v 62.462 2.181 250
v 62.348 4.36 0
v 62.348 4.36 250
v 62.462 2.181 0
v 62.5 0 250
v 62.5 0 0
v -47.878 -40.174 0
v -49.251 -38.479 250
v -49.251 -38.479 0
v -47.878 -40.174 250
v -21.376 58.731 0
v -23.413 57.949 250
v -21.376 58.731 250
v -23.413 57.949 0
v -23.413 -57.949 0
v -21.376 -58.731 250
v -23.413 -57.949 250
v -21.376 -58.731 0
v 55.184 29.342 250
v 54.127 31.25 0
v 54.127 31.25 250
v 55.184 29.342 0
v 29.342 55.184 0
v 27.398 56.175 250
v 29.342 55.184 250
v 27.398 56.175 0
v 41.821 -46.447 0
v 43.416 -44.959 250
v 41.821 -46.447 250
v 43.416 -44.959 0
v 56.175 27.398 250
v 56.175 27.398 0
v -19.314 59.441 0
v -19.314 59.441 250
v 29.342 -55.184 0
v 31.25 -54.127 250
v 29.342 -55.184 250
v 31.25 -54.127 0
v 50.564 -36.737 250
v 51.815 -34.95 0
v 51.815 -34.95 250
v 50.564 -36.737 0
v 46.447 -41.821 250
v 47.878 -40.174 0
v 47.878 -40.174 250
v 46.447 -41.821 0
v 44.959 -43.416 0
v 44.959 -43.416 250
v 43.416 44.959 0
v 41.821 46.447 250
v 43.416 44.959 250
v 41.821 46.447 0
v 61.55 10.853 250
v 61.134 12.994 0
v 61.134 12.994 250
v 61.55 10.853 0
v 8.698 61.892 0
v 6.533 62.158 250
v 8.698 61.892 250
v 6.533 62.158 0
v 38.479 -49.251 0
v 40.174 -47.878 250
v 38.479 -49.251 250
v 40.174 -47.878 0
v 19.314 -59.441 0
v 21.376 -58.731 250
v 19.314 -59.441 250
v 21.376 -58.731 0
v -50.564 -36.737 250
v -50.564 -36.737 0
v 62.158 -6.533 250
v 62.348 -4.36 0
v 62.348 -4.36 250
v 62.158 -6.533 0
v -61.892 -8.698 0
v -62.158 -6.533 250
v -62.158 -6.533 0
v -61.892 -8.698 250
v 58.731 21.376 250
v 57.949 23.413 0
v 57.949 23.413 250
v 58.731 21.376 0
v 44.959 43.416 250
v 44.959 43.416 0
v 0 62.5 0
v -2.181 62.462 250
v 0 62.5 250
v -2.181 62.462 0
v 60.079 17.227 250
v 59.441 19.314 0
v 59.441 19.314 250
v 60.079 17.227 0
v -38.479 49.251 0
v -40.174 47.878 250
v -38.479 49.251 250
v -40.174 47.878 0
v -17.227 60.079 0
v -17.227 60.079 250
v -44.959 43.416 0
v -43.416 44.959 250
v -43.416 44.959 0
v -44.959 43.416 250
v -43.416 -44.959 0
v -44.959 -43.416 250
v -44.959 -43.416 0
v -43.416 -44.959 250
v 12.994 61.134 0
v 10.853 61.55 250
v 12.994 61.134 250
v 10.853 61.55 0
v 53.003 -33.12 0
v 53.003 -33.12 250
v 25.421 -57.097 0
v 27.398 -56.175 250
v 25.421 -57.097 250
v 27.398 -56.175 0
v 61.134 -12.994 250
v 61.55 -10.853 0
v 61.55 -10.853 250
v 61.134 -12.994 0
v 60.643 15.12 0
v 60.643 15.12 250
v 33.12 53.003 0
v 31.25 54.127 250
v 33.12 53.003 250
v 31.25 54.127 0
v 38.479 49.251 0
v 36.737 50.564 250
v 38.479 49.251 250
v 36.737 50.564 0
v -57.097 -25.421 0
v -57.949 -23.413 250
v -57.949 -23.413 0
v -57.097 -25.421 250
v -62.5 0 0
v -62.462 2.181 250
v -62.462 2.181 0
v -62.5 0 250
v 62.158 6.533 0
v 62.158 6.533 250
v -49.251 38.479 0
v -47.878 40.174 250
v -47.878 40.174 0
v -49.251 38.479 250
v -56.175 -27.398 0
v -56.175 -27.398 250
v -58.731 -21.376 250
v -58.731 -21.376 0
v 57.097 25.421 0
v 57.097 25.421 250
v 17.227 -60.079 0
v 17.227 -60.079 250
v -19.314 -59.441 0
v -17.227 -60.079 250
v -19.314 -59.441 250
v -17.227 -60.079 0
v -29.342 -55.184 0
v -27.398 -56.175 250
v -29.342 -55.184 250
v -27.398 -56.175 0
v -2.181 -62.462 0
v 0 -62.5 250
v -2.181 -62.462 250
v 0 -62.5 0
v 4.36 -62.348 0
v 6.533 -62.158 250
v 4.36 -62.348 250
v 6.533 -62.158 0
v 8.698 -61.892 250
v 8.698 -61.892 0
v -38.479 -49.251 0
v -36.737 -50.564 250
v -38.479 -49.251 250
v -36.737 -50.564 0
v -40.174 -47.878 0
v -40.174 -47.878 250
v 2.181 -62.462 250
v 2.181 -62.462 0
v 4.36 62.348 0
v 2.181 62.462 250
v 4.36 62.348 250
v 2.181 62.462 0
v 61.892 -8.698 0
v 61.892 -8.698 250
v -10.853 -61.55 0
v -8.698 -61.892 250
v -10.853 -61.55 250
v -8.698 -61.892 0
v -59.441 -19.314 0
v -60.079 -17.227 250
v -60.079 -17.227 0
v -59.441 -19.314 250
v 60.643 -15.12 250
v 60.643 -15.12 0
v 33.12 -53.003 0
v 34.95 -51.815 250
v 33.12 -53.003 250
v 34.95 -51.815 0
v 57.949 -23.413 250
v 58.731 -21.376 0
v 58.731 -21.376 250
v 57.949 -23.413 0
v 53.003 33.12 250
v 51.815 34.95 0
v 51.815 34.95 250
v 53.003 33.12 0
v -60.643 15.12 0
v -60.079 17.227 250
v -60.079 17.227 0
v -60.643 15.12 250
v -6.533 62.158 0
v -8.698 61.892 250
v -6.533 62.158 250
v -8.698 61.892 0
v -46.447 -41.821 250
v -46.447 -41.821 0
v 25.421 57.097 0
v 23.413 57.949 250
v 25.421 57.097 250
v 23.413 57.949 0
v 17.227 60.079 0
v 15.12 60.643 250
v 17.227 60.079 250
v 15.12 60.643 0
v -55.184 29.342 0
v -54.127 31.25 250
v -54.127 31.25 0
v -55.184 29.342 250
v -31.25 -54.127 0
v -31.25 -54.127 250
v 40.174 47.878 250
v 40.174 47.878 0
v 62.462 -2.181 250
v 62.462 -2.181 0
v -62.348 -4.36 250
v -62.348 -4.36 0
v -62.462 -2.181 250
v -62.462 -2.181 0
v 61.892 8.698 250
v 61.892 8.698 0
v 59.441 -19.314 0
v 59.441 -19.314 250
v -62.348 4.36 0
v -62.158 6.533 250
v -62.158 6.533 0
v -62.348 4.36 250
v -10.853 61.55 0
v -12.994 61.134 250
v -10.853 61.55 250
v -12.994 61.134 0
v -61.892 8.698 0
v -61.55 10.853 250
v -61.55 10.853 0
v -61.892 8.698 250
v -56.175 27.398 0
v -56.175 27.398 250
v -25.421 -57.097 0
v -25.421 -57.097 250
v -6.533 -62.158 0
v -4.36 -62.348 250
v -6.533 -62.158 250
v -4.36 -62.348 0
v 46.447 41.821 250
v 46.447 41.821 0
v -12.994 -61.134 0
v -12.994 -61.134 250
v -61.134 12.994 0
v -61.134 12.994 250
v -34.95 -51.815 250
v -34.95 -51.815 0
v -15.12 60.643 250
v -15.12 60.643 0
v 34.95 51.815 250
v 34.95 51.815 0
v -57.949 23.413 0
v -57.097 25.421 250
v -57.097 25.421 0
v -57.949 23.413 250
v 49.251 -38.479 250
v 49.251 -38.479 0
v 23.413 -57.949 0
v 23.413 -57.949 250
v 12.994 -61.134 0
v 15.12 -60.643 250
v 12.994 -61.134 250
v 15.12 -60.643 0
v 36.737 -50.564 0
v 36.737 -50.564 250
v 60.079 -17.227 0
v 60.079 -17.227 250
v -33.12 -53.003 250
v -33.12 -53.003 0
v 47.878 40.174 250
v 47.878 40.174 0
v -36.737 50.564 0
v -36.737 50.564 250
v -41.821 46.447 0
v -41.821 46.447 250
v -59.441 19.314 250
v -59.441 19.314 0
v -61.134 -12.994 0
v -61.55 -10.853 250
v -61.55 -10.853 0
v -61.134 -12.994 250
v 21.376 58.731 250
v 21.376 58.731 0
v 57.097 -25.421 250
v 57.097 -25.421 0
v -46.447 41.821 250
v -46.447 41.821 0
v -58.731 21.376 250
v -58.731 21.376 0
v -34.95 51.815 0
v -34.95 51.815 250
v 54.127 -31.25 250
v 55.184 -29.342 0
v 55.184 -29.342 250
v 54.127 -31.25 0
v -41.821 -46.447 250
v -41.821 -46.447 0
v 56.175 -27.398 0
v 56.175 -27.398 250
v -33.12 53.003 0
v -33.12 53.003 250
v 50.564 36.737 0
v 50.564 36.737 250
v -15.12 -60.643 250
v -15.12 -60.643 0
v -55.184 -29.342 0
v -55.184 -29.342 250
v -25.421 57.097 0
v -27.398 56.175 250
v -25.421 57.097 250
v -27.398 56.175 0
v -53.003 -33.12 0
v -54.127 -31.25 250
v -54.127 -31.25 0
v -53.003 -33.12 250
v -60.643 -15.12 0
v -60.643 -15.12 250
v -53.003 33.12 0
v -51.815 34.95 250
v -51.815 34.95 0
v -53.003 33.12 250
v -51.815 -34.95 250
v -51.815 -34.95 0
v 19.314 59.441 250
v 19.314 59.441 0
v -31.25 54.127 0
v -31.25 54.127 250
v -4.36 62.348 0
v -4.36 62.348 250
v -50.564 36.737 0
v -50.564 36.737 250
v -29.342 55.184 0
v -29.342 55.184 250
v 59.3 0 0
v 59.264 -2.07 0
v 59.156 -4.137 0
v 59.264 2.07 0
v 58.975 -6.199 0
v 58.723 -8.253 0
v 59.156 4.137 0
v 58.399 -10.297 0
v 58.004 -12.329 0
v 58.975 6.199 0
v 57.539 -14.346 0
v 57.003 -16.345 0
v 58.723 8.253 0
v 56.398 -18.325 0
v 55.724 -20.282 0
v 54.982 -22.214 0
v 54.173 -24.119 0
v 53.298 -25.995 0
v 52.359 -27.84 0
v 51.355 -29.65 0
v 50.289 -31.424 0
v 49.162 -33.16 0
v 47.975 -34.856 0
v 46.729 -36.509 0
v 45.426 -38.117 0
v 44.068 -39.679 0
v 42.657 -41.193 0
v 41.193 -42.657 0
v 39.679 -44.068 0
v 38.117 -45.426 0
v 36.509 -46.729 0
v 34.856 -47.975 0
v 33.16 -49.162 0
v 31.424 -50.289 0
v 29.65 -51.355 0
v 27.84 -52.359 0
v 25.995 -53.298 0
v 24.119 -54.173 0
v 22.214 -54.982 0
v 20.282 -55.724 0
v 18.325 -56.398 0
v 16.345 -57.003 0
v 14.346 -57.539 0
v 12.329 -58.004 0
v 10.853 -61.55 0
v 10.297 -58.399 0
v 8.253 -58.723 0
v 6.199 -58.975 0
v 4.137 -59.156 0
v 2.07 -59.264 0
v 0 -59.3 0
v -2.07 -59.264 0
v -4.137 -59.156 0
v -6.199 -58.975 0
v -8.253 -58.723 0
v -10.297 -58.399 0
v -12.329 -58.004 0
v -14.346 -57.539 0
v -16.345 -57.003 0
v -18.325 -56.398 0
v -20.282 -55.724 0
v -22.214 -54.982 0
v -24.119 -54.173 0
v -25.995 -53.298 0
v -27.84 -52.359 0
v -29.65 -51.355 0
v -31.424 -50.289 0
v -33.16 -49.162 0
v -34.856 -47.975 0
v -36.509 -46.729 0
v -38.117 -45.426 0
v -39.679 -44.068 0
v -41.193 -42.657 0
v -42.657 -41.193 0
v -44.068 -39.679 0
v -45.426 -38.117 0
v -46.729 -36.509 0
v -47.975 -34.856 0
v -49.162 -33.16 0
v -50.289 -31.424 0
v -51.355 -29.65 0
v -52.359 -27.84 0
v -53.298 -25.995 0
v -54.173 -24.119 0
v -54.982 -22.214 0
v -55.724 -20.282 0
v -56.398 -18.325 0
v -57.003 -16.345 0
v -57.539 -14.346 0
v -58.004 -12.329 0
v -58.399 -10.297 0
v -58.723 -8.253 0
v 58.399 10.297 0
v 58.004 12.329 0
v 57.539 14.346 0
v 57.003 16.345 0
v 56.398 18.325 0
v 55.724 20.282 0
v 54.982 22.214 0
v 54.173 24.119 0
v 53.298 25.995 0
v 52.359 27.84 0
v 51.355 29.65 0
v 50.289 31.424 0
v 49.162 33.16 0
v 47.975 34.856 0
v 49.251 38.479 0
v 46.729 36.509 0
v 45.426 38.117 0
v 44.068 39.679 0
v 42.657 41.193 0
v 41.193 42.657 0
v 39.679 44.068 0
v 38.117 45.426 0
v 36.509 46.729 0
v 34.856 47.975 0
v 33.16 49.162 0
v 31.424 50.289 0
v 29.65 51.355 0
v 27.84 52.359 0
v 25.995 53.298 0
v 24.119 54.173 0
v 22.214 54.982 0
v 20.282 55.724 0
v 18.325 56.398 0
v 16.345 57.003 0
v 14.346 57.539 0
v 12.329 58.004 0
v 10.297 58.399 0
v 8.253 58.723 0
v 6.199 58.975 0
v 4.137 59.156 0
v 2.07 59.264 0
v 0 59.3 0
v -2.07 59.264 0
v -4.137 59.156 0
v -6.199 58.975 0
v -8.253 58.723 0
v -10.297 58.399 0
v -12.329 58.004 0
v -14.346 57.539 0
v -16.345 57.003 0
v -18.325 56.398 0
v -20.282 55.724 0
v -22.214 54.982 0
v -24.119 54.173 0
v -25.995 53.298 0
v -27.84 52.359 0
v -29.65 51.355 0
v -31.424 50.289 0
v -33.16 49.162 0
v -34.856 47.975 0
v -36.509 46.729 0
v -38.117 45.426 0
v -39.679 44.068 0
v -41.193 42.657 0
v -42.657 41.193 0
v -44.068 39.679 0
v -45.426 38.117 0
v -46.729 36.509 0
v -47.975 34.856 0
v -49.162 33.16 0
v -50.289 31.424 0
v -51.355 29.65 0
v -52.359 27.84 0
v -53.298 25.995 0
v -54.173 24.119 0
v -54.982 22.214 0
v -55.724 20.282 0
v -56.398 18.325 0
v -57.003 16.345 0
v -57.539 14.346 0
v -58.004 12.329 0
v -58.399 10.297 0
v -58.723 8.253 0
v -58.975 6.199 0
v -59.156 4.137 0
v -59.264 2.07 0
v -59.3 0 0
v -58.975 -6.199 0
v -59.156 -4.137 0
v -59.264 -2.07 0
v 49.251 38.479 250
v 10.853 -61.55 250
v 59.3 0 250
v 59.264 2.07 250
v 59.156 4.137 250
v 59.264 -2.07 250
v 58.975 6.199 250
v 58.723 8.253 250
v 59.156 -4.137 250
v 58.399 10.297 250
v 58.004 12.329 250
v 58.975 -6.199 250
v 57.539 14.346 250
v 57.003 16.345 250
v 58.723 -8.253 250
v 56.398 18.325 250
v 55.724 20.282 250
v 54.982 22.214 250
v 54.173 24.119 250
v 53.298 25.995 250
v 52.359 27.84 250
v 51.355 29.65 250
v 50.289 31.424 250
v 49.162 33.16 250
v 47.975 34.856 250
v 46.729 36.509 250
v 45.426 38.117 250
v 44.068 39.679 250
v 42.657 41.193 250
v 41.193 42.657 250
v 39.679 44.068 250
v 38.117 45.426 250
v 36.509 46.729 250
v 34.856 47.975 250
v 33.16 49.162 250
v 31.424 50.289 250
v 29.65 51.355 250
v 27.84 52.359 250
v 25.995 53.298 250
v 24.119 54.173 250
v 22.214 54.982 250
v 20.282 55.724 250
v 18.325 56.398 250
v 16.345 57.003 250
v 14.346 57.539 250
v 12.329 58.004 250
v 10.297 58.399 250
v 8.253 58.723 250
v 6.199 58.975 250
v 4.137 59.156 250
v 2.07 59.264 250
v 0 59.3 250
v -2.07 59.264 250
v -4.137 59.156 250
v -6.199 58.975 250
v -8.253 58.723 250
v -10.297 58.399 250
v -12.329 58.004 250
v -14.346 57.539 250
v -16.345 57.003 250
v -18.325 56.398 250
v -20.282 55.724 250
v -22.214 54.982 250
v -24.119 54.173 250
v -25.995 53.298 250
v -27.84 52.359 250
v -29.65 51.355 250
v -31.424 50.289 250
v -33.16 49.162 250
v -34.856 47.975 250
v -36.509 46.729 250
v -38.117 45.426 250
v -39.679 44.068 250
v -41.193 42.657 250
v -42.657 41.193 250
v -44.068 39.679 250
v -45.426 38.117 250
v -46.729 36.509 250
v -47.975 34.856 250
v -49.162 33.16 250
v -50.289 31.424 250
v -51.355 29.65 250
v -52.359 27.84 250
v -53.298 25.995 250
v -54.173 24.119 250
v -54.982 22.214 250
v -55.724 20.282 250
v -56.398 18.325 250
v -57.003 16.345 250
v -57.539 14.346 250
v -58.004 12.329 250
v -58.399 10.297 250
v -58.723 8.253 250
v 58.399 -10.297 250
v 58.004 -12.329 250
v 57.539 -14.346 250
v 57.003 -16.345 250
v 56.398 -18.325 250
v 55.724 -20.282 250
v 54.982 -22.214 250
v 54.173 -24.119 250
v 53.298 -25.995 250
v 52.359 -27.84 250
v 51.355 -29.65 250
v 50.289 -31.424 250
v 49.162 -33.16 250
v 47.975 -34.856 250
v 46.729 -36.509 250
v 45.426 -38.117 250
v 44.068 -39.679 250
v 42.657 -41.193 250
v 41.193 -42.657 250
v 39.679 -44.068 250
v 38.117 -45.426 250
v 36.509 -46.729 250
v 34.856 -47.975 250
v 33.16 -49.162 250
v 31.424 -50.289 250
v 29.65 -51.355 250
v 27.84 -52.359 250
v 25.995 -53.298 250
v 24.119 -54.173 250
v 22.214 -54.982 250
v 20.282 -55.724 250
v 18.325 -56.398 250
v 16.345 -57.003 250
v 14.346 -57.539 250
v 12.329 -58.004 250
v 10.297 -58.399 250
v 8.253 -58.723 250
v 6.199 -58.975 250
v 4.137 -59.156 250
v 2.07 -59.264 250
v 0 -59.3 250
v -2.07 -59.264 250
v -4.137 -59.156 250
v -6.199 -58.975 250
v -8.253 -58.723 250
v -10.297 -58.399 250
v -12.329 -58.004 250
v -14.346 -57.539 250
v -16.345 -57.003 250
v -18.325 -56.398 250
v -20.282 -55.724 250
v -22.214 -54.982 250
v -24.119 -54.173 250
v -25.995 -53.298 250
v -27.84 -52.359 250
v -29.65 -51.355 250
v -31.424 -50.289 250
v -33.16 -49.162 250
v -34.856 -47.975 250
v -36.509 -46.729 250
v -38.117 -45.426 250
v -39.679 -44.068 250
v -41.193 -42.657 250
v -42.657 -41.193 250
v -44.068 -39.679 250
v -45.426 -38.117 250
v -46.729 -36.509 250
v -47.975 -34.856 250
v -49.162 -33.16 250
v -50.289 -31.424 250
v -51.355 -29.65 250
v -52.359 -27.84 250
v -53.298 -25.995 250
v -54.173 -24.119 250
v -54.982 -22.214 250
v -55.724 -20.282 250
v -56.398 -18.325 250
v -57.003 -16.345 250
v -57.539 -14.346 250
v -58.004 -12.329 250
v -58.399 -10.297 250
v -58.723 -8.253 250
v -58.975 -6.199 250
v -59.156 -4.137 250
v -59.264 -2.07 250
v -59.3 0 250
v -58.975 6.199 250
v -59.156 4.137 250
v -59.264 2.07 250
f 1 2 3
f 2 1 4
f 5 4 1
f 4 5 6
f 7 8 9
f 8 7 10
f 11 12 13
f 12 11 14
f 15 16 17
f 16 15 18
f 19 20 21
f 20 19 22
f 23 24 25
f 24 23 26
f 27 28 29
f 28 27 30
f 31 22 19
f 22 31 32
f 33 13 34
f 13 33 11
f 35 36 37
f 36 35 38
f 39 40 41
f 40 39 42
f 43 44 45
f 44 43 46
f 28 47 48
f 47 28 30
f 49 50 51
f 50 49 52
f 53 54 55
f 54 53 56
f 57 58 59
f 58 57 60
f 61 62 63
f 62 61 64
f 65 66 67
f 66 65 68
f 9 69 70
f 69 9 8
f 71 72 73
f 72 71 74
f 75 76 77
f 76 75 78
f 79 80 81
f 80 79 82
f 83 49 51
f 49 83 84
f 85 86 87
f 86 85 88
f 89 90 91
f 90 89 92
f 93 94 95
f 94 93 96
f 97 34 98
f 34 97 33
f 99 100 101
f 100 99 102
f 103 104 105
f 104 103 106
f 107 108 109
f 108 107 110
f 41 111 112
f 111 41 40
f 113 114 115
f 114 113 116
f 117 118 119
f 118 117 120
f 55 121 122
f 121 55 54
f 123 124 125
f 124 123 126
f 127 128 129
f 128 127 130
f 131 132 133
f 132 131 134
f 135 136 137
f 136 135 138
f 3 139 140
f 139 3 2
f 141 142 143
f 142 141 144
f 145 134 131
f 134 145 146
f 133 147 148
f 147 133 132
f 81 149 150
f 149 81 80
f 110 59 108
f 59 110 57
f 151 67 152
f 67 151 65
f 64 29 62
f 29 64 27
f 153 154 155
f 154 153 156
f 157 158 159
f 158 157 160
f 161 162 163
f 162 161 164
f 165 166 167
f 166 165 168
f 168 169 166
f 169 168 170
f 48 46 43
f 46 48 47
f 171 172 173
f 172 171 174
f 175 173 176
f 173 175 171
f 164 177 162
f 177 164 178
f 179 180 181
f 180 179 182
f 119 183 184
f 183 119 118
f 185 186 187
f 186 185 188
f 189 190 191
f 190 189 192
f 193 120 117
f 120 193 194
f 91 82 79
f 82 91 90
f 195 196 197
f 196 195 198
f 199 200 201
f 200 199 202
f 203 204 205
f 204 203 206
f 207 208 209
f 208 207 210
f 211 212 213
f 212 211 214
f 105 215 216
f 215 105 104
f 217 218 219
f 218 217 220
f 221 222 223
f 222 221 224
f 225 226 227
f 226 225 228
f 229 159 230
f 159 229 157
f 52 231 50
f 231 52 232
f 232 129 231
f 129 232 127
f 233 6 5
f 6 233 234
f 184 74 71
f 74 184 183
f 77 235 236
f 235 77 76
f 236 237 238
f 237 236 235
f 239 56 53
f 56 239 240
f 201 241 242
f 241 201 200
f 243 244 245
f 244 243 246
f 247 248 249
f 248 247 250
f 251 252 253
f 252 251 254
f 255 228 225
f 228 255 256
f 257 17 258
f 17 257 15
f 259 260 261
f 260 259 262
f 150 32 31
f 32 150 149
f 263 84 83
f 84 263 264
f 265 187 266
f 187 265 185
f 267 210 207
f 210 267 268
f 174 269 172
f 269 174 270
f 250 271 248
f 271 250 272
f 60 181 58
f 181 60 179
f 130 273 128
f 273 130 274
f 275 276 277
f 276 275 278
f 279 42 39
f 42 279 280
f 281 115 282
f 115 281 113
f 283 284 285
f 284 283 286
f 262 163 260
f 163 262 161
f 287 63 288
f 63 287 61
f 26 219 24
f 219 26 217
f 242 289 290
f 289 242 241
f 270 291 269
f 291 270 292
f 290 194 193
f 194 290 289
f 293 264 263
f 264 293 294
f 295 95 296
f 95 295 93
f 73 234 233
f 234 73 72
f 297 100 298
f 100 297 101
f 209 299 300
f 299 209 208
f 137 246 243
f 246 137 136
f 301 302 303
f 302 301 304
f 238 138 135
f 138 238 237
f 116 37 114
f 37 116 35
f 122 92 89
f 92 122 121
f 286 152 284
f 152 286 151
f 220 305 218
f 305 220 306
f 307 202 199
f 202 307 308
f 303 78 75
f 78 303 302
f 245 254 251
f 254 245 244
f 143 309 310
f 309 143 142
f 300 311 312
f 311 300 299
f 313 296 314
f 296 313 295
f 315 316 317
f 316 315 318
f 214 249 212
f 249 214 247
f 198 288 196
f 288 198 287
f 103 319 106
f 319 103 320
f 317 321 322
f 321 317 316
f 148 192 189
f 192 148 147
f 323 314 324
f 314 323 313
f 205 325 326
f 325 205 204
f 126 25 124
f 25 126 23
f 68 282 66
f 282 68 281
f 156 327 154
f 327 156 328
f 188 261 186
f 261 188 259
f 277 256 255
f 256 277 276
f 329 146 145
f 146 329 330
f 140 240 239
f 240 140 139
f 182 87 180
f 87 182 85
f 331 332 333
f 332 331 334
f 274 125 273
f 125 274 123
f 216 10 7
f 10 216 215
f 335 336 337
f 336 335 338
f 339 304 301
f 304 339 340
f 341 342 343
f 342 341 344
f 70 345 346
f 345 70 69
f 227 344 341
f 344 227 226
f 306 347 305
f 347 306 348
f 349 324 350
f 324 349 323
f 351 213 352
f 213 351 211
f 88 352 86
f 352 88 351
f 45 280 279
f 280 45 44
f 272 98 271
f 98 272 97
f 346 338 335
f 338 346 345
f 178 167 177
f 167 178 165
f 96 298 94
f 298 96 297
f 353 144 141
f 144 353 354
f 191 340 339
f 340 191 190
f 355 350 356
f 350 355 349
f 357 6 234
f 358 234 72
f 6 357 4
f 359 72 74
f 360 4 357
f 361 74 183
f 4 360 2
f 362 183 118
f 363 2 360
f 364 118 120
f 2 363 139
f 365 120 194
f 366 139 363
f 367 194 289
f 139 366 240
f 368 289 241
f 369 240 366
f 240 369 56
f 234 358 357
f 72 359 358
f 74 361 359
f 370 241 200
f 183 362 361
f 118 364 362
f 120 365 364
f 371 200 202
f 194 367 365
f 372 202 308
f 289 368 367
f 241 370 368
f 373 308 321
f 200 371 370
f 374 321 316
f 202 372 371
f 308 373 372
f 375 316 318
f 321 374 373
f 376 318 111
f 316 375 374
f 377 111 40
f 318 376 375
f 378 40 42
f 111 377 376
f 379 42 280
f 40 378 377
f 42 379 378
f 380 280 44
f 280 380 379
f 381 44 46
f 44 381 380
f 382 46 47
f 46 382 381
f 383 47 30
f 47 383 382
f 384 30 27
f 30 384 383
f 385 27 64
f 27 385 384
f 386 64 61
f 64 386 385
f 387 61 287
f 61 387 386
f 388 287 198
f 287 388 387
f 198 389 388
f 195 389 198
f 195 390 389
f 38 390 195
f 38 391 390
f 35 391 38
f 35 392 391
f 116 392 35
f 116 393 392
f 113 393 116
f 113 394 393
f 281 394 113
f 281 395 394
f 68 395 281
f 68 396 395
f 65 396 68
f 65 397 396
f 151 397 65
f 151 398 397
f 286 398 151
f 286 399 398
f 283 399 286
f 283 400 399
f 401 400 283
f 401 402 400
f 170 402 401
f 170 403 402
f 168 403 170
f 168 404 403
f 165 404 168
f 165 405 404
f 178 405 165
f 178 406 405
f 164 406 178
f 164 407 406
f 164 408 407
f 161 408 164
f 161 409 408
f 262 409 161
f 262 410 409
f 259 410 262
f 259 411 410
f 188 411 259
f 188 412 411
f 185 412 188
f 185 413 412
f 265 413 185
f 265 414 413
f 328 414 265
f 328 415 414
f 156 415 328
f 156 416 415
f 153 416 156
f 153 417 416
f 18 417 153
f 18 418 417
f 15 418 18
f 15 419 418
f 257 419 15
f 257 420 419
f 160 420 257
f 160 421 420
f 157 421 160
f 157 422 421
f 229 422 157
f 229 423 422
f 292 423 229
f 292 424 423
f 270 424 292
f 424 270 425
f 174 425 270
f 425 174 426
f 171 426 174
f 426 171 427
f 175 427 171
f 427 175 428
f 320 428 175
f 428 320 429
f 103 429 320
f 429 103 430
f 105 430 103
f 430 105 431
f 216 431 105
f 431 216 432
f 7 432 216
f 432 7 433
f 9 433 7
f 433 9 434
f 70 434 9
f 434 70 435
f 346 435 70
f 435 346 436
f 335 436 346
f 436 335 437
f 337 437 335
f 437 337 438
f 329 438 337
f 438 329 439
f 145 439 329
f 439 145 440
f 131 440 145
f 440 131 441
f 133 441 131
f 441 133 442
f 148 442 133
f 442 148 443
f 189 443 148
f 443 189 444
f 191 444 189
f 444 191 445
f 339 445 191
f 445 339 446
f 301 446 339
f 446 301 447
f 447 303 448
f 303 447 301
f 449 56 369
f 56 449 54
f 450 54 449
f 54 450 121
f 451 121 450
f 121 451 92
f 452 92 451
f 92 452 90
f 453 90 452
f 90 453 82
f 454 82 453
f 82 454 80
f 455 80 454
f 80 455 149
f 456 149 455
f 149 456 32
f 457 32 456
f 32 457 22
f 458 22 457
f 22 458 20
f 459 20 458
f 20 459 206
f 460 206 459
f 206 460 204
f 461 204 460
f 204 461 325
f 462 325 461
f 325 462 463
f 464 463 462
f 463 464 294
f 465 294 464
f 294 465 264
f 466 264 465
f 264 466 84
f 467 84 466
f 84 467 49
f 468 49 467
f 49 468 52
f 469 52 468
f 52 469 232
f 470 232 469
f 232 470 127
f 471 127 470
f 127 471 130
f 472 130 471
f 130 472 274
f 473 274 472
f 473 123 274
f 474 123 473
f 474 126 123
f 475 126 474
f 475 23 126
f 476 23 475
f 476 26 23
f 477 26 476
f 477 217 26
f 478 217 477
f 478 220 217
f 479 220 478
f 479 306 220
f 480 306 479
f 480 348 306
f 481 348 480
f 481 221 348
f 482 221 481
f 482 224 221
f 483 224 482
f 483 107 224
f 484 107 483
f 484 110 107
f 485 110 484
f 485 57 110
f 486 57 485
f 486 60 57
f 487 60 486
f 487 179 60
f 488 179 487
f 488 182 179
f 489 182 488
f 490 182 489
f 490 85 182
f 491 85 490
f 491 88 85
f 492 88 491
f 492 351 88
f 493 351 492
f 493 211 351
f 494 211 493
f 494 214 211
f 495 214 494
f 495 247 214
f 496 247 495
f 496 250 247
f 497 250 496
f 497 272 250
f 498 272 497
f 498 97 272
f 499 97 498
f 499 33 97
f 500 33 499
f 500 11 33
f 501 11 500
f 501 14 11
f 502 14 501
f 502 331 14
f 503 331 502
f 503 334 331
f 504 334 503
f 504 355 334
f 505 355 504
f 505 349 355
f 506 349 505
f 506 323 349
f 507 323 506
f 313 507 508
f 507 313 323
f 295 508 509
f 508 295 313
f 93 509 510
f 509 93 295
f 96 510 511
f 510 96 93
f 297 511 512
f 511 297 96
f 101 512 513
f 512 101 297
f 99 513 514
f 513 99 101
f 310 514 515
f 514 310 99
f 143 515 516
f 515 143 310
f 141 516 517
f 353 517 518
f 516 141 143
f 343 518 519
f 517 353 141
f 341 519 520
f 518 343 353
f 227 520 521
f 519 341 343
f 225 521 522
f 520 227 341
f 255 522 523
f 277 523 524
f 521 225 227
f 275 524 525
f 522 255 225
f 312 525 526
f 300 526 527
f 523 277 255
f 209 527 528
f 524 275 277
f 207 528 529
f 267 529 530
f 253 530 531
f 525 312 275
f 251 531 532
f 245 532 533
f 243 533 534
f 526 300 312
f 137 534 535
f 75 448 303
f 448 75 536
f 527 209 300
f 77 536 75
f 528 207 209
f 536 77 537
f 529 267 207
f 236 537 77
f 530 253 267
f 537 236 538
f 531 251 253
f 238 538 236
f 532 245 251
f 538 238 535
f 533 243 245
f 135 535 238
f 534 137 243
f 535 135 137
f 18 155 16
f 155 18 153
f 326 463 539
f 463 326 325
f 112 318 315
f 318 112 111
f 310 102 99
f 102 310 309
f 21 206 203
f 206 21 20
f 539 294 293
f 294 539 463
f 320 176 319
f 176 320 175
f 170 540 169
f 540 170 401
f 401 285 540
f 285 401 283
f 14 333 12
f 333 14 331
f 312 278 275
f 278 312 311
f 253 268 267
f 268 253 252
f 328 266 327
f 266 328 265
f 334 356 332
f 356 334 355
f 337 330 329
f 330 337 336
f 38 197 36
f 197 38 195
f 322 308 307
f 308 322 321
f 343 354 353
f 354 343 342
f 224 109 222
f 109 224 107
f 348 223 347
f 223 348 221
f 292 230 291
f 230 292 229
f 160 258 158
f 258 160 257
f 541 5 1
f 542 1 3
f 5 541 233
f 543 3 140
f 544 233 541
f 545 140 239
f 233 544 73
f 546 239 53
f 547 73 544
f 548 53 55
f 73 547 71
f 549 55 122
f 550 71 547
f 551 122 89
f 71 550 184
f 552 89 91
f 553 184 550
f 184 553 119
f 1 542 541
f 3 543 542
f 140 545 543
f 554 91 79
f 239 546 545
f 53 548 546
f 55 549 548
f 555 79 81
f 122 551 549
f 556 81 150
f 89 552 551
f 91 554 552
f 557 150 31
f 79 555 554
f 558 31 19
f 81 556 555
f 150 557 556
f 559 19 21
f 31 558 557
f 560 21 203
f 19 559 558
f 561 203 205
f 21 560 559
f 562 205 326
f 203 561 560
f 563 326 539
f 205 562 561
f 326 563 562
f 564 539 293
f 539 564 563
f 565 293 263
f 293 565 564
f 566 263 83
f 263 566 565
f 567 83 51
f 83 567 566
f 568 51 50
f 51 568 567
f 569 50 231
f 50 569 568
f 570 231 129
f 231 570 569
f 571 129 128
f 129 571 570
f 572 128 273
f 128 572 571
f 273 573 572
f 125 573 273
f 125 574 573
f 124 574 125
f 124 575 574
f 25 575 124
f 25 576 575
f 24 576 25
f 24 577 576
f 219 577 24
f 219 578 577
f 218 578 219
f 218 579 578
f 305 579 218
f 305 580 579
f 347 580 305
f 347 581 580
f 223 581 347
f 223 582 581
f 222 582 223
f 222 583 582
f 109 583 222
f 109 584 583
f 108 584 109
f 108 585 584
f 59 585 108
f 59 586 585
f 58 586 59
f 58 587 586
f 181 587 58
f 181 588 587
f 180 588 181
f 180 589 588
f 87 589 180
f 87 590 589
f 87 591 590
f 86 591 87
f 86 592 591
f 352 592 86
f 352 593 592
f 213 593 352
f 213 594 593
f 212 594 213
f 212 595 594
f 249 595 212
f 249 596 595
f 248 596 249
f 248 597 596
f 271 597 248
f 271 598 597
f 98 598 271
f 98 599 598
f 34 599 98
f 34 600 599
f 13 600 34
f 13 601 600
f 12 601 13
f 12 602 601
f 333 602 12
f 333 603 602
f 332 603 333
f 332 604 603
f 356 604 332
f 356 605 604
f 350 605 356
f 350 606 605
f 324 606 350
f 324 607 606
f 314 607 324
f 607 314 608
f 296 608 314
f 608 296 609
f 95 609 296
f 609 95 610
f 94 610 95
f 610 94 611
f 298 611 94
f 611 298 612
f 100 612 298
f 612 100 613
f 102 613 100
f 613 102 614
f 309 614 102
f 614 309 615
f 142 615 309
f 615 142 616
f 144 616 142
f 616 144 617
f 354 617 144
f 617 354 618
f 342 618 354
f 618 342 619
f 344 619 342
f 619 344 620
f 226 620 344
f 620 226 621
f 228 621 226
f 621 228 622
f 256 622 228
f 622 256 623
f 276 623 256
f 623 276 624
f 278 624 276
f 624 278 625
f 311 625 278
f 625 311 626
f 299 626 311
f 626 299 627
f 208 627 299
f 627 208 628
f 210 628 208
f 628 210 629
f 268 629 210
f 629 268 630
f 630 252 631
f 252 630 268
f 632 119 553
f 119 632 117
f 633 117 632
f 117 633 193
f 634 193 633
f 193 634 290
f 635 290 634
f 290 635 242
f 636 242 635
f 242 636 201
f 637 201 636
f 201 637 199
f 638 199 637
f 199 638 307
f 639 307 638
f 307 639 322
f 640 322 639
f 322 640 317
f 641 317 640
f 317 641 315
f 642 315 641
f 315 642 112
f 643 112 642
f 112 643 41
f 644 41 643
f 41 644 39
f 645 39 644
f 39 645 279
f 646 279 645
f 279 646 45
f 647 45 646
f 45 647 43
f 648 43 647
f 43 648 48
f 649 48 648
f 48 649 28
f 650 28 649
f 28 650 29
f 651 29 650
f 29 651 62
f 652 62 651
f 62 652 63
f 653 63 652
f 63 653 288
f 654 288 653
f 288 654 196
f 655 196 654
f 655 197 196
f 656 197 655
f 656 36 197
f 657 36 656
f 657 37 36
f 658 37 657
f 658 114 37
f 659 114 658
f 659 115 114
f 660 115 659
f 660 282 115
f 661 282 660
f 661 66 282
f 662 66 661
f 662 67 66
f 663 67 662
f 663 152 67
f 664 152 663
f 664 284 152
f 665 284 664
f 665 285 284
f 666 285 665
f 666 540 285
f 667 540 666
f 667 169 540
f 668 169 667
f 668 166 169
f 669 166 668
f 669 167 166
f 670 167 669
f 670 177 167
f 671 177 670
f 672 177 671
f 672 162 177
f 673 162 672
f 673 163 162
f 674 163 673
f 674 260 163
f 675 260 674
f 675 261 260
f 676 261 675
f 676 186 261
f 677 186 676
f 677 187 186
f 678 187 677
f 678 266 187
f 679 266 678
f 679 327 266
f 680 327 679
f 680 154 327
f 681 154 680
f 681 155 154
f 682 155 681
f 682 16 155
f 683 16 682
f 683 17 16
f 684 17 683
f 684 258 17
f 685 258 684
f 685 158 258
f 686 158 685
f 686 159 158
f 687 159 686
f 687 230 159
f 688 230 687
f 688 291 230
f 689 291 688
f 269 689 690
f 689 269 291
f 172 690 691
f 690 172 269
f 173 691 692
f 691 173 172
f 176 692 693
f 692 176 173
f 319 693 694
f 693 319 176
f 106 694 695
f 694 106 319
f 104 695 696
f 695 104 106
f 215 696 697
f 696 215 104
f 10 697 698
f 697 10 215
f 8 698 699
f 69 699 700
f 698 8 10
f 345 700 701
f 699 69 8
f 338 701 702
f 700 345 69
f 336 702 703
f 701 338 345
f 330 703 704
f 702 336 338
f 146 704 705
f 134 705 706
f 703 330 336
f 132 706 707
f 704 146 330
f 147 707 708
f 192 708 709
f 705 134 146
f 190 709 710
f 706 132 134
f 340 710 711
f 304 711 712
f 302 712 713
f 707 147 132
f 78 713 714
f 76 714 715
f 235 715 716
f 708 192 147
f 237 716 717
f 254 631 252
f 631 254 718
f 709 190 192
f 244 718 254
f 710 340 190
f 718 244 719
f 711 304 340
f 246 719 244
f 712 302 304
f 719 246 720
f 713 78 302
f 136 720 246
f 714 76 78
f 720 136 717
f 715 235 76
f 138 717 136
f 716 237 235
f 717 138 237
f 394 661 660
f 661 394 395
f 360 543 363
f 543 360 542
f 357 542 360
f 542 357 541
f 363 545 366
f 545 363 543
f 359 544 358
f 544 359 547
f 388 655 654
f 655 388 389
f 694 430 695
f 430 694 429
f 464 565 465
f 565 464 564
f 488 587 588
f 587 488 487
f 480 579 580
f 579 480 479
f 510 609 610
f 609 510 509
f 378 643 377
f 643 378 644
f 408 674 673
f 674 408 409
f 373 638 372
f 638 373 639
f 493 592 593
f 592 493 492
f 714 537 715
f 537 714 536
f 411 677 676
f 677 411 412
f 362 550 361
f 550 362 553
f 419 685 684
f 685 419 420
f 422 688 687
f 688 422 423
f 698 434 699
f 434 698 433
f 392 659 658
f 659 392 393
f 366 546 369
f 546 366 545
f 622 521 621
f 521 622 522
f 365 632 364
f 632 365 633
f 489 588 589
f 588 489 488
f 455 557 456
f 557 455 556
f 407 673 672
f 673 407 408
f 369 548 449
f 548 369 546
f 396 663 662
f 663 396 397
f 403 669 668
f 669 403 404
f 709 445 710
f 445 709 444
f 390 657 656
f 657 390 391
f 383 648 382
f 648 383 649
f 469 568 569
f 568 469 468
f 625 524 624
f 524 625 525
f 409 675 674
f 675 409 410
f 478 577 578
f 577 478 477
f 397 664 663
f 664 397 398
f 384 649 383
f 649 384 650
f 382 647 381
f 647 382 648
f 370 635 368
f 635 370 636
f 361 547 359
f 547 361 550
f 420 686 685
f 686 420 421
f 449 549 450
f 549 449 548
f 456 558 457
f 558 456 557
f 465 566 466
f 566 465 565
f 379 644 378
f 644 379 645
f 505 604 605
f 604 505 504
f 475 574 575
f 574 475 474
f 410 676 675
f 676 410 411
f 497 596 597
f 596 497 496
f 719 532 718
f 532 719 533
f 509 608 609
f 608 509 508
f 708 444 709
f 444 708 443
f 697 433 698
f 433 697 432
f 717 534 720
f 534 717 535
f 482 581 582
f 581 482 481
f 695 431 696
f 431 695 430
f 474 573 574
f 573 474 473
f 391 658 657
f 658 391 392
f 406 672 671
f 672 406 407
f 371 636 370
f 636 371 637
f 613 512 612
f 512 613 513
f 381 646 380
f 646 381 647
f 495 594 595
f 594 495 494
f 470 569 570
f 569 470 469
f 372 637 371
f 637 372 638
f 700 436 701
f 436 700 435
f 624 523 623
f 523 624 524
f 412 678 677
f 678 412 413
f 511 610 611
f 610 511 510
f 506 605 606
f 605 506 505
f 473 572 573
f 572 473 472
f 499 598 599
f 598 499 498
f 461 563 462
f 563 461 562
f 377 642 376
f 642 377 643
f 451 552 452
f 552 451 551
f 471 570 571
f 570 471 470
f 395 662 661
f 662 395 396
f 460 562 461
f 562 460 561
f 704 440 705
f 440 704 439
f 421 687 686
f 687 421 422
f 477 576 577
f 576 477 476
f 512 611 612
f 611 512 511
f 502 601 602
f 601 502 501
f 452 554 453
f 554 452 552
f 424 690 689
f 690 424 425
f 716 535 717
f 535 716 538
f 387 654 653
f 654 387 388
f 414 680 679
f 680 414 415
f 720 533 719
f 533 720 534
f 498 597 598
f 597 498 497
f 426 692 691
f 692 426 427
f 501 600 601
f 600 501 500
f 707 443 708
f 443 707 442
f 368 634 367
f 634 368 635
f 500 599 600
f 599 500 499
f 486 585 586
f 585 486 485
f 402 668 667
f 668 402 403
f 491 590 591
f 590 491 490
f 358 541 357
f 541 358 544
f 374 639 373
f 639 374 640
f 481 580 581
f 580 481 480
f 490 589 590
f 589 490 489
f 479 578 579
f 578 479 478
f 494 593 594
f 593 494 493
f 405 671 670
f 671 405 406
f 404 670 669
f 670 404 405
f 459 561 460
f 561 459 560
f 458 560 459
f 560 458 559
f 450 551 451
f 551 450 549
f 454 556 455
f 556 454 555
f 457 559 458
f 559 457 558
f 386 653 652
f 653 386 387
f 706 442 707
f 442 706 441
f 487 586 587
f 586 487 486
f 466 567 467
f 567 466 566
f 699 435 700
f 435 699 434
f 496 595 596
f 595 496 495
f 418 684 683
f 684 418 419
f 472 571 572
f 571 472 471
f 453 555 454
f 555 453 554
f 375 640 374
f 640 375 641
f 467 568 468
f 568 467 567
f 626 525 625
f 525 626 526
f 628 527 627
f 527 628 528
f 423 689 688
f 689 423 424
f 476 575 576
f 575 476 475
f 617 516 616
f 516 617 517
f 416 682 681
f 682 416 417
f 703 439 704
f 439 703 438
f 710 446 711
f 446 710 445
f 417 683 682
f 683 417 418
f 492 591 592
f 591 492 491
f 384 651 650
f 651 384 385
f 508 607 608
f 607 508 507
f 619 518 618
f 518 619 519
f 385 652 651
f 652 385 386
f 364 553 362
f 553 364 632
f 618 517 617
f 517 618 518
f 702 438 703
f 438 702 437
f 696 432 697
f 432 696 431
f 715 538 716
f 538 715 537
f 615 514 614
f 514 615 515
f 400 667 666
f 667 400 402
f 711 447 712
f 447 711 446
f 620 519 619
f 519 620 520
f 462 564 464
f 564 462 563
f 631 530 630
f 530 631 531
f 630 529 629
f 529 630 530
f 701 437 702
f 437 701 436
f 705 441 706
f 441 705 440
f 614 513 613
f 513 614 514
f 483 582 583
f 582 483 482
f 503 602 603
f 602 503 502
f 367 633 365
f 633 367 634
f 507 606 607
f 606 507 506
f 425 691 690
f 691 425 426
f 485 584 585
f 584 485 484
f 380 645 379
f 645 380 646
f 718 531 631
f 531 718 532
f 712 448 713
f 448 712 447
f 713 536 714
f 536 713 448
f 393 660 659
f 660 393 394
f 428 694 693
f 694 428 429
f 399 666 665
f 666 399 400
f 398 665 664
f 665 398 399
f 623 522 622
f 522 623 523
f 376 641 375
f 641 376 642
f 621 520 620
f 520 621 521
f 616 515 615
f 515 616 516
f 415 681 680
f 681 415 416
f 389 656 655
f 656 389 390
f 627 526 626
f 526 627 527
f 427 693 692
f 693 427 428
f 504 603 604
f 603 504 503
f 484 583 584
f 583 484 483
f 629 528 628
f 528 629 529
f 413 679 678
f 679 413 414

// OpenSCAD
$fn = 180;

// HT pipe parameters (approximate for HT 125)
pipe_length = 250;          // mm
outer_diameter = 125;       // mm
wall_thickness = 3.2;       // mm (typical for HT DN125)
inner_diameter = outer_diameter - 2*wall_thickness;

module ht_pipe(od, id, len) {
    difference() {
        cylinder(h = len, d = od, center = false);
        translate([0,0,-0.5])
            cylinder(h = len + 1, d = id, center = false);
    }
}

ht_pipe(outer_diameter, inner_diameter, pipe_length);
